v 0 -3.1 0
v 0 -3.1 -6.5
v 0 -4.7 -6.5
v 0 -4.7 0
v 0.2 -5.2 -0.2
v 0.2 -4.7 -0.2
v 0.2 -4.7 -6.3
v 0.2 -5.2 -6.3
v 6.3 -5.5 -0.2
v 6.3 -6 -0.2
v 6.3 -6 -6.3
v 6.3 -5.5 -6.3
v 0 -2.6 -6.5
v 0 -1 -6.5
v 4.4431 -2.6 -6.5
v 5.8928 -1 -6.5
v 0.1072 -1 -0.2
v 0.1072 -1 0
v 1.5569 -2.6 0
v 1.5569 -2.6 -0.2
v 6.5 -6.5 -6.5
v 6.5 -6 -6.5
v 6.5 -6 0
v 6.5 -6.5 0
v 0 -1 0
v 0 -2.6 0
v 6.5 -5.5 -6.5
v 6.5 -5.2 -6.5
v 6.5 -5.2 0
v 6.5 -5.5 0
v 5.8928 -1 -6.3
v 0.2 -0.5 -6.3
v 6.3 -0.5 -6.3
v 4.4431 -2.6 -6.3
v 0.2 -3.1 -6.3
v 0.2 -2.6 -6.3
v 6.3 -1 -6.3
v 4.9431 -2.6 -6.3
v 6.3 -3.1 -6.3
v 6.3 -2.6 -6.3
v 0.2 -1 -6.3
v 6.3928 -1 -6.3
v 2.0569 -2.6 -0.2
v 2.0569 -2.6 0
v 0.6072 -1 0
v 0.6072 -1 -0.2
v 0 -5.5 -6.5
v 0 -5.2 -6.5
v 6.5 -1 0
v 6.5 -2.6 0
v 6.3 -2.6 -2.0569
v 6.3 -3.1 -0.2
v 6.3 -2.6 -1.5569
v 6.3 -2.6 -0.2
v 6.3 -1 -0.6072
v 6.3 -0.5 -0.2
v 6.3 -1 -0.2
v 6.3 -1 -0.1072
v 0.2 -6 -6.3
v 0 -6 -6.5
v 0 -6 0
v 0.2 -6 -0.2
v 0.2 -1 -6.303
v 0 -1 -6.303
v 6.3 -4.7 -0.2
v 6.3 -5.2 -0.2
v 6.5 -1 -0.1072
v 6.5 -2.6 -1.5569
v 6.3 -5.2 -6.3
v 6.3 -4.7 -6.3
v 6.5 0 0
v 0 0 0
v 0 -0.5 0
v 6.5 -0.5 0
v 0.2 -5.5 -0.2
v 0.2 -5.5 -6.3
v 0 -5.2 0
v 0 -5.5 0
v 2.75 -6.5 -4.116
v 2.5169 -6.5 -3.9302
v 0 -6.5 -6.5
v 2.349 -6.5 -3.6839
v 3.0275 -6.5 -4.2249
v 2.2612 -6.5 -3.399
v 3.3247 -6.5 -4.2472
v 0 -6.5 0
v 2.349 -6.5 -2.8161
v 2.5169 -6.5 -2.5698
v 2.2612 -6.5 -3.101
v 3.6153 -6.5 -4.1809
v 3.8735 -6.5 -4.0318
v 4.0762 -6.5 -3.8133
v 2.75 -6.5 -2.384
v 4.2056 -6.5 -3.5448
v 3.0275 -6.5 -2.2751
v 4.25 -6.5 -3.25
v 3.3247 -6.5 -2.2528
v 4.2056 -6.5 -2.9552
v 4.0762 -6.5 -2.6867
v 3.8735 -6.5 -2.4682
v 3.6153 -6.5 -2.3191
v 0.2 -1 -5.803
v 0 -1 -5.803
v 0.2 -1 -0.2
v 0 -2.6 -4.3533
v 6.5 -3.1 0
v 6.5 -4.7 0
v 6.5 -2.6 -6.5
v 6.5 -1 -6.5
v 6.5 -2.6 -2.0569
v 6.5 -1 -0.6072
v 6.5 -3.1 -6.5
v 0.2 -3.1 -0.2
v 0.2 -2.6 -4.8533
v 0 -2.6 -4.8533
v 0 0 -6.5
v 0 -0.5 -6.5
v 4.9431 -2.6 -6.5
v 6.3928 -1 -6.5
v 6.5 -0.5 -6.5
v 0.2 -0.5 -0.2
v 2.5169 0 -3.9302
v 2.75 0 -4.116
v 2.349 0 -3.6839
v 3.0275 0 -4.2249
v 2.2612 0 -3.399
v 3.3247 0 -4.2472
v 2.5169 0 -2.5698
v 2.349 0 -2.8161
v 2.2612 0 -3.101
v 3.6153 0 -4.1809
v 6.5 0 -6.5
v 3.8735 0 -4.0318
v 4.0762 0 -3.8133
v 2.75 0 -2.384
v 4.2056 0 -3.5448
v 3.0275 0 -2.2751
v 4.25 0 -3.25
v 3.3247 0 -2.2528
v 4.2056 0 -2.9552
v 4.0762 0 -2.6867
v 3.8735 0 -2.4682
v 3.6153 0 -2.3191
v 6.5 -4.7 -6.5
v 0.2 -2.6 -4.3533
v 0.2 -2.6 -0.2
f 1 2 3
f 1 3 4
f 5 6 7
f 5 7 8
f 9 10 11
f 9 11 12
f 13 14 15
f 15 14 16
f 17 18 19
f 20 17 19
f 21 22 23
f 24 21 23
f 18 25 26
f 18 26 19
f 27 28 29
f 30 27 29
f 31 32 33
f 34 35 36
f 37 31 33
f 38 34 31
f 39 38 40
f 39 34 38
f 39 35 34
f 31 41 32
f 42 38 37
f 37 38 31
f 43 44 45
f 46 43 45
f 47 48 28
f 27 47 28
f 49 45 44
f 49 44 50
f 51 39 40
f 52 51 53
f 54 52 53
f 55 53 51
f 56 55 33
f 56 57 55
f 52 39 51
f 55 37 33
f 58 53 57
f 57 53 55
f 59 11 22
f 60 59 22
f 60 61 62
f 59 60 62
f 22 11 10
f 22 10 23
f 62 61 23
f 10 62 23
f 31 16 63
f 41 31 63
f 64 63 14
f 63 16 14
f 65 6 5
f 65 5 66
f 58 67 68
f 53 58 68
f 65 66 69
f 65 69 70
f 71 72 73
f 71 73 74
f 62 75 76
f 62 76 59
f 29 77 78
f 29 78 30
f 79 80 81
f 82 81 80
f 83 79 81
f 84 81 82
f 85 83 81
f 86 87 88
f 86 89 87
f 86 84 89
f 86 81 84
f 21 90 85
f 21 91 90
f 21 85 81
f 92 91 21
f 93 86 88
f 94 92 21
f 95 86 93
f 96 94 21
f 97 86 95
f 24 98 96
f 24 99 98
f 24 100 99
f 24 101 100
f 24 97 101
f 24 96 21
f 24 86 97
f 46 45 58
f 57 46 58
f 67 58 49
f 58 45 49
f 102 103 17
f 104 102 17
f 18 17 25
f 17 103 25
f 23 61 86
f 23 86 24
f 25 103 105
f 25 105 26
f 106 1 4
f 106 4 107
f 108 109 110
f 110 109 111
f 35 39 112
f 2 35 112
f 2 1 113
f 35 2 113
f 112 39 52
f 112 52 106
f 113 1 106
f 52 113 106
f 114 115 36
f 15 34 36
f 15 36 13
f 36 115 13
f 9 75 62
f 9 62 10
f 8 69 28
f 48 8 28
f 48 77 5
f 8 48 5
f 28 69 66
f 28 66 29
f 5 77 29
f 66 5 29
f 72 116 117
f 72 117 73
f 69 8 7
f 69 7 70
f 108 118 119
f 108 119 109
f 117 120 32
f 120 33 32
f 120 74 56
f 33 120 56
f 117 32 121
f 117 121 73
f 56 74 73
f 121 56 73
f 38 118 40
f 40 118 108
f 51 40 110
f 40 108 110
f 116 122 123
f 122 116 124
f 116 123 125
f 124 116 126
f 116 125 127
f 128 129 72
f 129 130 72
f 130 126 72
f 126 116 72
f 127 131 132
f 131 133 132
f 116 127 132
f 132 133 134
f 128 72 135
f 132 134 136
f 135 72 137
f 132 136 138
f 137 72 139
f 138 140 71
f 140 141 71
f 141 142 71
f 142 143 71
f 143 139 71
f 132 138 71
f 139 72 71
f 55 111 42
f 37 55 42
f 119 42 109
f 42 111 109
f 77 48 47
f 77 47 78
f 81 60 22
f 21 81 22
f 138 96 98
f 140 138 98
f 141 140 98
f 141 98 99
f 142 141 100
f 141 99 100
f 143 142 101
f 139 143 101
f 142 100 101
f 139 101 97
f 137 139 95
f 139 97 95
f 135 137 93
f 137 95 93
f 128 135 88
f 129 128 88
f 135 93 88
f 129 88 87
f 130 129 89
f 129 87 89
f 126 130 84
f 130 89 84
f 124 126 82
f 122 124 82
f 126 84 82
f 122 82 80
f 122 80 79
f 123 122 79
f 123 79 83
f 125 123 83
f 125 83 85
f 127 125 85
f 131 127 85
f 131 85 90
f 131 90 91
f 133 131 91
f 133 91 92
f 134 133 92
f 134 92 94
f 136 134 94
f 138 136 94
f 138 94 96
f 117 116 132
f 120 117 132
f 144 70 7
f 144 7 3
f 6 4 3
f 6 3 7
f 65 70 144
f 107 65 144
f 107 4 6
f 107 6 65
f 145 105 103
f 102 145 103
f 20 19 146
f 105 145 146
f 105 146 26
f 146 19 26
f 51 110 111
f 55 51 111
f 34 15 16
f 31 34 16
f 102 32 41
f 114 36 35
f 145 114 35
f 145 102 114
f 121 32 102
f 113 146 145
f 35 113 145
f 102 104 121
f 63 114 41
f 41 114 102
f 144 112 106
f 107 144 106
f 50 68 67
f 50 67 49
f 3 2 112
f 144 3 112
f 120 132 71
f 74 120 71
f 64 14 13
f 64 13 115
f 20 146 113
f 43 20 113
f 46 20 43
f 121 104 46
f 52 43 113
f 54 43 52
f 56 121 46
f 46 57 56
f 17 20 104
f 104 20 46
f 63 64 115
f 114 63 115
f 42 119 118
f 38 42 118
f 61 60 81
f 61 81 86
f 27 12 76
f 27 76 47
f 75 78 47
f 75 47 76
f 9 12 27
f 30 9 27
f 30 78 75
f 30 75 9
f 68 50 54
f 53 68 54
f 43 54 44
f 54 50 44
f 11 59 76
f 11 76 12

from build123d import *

# Parameters (mm, degrees)
F0_W      = 6.5
F0_H      = 6.5
F1_DEPTH  = 6.5
F2_R      = 1
F3_DEPTH  = 25
F4_W      = 0.5
F4_H      = 6.5
F5_DEPTH  = 0.2
F6_W      = 6.3
F6_H      = 0.5
F7_DEPTH  = 0.2
F8_W      = 0.5
F8_H      = 6.3
F9_DEPTH  = 0.2
F10_W     = 6.1
F10_H     = 0.5
F11_DEPTH = 0.2


with BuildPart() as f1:
    # F0 (on Front) → F1 (new body)
    with BuildSketch(Plane.XZ):
        with Locations((3.25, -3.25)):
            Rectangle(F0_W, F0_H)
    extrude(amount=F1_DEPTH)

    # F2 (on face) → F3 (cut)
    with BuildSketch(Plane.XZ.offset(6.5)):
        with Locations((3.25, -3.25)):
            Circle(F2_R)
    extrude(amount=-F3_DEPTH, mode=Mode.SUBTRACT)

    # F4 (on face) → F5 (cut)
    with BuildSketch(Plane.YZ.offset(6.5)):
        with Locations((-5.75, -3.25)):
            Rectangle(F4_W, F4_H)
        with Locations((-4.95, -3.25)):
            Rectangle(F4_W, F4_H)
        Polygon((-3.1, 0), (-3.1, -6.5), (-2.6, -6.5), (-2.6, -2.0569080953), (-1, -0.6072367541), (-1, -6.5), (-0.5, -6.5), (-0.5, 0), (-1, 0), (-1, -0.1072367541), (-2.6, -1.5569080953), (-2.6, 0), align=None)
    extrude(amount=-F5_DEPTH, mode=Mode.SUBTRACT)

    # F6 (on face) → F7 (cut)
    with BuildSketch(Plane.XY):
        with Locations((3.15, -5.75)):
            Rectangle(F6_W, F6_H)
        with Locations((3.15, -4.95)):
            Rectangle(F6_W, F6_H)
        Polygon((0, -2.6), (0, -3.1), (6.3, -3.1), (6.3, -2.6), (2.0569080953, -2.6), (0.6072367541, -1), (6.3, -1), (6.3, -0.5), (0, -0.5), (0, -1), (0.1072367541, -1), (1.5569080953, -2.6), align=None)
    extrude(amount=-F7_DEPTH, mode=Mode.SUBTRACT)

    # F8 (on face) → F9 (cut)
    with BuildSketch(Plane(origin=(0, 0, 0), x_dir=(0, -1, 0), z_dir=(-1, 0, 0))):
        with Locations((5.75, -3.35)):
            Rectangle(F8_W, F8_H)
        with Locations((4.95, -3.35)):
            Rectangle(F8_W, F8_H)
        Polygon((2.6, -6.5), (3.1, -6.5), (3.1, -0.2), (2.6, -0.2), (2.6, -4.3532891255), (1, -5.8029604666), (1, -0.2), (0.5, -0.2), (0.5, -6.5), (1, -6.5), (1, -6.3029604666), (2.6, -4.8532891255), align=None)
    extrude(amount=-F9_DEPTH, mode=Mode.SUBTRACT)

    # F10 (on face) → F11 (cut)
    with BuildSketch(Plane(origin=(0, 0, -6.5), x_dir=(1, 0, 0), z_dir=(0, 0, -1))):
        with Locations((3.25, 5.75)):
            Rectangle(F10_W, F10_H)
        with Locations((3.25, 4.95)):
            Rectangle(F10_W, F10_H)
        Polygon((6.3, 3.1), (0.2, 3.1), (0.2, 2.6), (4.4430919047, 2.6), (5.8927632459, 1), (0.2, 1), (0.2, 0.5), (6.3, 0.5), (6.3, 1), (6.3927632459, 1), (4.9430919047, 2.6), (6.3, 2.6), align=None)
    extrude(amount=-F11_DEPTH, mode=Mode.SUBTRACT)


solid = f1.part
